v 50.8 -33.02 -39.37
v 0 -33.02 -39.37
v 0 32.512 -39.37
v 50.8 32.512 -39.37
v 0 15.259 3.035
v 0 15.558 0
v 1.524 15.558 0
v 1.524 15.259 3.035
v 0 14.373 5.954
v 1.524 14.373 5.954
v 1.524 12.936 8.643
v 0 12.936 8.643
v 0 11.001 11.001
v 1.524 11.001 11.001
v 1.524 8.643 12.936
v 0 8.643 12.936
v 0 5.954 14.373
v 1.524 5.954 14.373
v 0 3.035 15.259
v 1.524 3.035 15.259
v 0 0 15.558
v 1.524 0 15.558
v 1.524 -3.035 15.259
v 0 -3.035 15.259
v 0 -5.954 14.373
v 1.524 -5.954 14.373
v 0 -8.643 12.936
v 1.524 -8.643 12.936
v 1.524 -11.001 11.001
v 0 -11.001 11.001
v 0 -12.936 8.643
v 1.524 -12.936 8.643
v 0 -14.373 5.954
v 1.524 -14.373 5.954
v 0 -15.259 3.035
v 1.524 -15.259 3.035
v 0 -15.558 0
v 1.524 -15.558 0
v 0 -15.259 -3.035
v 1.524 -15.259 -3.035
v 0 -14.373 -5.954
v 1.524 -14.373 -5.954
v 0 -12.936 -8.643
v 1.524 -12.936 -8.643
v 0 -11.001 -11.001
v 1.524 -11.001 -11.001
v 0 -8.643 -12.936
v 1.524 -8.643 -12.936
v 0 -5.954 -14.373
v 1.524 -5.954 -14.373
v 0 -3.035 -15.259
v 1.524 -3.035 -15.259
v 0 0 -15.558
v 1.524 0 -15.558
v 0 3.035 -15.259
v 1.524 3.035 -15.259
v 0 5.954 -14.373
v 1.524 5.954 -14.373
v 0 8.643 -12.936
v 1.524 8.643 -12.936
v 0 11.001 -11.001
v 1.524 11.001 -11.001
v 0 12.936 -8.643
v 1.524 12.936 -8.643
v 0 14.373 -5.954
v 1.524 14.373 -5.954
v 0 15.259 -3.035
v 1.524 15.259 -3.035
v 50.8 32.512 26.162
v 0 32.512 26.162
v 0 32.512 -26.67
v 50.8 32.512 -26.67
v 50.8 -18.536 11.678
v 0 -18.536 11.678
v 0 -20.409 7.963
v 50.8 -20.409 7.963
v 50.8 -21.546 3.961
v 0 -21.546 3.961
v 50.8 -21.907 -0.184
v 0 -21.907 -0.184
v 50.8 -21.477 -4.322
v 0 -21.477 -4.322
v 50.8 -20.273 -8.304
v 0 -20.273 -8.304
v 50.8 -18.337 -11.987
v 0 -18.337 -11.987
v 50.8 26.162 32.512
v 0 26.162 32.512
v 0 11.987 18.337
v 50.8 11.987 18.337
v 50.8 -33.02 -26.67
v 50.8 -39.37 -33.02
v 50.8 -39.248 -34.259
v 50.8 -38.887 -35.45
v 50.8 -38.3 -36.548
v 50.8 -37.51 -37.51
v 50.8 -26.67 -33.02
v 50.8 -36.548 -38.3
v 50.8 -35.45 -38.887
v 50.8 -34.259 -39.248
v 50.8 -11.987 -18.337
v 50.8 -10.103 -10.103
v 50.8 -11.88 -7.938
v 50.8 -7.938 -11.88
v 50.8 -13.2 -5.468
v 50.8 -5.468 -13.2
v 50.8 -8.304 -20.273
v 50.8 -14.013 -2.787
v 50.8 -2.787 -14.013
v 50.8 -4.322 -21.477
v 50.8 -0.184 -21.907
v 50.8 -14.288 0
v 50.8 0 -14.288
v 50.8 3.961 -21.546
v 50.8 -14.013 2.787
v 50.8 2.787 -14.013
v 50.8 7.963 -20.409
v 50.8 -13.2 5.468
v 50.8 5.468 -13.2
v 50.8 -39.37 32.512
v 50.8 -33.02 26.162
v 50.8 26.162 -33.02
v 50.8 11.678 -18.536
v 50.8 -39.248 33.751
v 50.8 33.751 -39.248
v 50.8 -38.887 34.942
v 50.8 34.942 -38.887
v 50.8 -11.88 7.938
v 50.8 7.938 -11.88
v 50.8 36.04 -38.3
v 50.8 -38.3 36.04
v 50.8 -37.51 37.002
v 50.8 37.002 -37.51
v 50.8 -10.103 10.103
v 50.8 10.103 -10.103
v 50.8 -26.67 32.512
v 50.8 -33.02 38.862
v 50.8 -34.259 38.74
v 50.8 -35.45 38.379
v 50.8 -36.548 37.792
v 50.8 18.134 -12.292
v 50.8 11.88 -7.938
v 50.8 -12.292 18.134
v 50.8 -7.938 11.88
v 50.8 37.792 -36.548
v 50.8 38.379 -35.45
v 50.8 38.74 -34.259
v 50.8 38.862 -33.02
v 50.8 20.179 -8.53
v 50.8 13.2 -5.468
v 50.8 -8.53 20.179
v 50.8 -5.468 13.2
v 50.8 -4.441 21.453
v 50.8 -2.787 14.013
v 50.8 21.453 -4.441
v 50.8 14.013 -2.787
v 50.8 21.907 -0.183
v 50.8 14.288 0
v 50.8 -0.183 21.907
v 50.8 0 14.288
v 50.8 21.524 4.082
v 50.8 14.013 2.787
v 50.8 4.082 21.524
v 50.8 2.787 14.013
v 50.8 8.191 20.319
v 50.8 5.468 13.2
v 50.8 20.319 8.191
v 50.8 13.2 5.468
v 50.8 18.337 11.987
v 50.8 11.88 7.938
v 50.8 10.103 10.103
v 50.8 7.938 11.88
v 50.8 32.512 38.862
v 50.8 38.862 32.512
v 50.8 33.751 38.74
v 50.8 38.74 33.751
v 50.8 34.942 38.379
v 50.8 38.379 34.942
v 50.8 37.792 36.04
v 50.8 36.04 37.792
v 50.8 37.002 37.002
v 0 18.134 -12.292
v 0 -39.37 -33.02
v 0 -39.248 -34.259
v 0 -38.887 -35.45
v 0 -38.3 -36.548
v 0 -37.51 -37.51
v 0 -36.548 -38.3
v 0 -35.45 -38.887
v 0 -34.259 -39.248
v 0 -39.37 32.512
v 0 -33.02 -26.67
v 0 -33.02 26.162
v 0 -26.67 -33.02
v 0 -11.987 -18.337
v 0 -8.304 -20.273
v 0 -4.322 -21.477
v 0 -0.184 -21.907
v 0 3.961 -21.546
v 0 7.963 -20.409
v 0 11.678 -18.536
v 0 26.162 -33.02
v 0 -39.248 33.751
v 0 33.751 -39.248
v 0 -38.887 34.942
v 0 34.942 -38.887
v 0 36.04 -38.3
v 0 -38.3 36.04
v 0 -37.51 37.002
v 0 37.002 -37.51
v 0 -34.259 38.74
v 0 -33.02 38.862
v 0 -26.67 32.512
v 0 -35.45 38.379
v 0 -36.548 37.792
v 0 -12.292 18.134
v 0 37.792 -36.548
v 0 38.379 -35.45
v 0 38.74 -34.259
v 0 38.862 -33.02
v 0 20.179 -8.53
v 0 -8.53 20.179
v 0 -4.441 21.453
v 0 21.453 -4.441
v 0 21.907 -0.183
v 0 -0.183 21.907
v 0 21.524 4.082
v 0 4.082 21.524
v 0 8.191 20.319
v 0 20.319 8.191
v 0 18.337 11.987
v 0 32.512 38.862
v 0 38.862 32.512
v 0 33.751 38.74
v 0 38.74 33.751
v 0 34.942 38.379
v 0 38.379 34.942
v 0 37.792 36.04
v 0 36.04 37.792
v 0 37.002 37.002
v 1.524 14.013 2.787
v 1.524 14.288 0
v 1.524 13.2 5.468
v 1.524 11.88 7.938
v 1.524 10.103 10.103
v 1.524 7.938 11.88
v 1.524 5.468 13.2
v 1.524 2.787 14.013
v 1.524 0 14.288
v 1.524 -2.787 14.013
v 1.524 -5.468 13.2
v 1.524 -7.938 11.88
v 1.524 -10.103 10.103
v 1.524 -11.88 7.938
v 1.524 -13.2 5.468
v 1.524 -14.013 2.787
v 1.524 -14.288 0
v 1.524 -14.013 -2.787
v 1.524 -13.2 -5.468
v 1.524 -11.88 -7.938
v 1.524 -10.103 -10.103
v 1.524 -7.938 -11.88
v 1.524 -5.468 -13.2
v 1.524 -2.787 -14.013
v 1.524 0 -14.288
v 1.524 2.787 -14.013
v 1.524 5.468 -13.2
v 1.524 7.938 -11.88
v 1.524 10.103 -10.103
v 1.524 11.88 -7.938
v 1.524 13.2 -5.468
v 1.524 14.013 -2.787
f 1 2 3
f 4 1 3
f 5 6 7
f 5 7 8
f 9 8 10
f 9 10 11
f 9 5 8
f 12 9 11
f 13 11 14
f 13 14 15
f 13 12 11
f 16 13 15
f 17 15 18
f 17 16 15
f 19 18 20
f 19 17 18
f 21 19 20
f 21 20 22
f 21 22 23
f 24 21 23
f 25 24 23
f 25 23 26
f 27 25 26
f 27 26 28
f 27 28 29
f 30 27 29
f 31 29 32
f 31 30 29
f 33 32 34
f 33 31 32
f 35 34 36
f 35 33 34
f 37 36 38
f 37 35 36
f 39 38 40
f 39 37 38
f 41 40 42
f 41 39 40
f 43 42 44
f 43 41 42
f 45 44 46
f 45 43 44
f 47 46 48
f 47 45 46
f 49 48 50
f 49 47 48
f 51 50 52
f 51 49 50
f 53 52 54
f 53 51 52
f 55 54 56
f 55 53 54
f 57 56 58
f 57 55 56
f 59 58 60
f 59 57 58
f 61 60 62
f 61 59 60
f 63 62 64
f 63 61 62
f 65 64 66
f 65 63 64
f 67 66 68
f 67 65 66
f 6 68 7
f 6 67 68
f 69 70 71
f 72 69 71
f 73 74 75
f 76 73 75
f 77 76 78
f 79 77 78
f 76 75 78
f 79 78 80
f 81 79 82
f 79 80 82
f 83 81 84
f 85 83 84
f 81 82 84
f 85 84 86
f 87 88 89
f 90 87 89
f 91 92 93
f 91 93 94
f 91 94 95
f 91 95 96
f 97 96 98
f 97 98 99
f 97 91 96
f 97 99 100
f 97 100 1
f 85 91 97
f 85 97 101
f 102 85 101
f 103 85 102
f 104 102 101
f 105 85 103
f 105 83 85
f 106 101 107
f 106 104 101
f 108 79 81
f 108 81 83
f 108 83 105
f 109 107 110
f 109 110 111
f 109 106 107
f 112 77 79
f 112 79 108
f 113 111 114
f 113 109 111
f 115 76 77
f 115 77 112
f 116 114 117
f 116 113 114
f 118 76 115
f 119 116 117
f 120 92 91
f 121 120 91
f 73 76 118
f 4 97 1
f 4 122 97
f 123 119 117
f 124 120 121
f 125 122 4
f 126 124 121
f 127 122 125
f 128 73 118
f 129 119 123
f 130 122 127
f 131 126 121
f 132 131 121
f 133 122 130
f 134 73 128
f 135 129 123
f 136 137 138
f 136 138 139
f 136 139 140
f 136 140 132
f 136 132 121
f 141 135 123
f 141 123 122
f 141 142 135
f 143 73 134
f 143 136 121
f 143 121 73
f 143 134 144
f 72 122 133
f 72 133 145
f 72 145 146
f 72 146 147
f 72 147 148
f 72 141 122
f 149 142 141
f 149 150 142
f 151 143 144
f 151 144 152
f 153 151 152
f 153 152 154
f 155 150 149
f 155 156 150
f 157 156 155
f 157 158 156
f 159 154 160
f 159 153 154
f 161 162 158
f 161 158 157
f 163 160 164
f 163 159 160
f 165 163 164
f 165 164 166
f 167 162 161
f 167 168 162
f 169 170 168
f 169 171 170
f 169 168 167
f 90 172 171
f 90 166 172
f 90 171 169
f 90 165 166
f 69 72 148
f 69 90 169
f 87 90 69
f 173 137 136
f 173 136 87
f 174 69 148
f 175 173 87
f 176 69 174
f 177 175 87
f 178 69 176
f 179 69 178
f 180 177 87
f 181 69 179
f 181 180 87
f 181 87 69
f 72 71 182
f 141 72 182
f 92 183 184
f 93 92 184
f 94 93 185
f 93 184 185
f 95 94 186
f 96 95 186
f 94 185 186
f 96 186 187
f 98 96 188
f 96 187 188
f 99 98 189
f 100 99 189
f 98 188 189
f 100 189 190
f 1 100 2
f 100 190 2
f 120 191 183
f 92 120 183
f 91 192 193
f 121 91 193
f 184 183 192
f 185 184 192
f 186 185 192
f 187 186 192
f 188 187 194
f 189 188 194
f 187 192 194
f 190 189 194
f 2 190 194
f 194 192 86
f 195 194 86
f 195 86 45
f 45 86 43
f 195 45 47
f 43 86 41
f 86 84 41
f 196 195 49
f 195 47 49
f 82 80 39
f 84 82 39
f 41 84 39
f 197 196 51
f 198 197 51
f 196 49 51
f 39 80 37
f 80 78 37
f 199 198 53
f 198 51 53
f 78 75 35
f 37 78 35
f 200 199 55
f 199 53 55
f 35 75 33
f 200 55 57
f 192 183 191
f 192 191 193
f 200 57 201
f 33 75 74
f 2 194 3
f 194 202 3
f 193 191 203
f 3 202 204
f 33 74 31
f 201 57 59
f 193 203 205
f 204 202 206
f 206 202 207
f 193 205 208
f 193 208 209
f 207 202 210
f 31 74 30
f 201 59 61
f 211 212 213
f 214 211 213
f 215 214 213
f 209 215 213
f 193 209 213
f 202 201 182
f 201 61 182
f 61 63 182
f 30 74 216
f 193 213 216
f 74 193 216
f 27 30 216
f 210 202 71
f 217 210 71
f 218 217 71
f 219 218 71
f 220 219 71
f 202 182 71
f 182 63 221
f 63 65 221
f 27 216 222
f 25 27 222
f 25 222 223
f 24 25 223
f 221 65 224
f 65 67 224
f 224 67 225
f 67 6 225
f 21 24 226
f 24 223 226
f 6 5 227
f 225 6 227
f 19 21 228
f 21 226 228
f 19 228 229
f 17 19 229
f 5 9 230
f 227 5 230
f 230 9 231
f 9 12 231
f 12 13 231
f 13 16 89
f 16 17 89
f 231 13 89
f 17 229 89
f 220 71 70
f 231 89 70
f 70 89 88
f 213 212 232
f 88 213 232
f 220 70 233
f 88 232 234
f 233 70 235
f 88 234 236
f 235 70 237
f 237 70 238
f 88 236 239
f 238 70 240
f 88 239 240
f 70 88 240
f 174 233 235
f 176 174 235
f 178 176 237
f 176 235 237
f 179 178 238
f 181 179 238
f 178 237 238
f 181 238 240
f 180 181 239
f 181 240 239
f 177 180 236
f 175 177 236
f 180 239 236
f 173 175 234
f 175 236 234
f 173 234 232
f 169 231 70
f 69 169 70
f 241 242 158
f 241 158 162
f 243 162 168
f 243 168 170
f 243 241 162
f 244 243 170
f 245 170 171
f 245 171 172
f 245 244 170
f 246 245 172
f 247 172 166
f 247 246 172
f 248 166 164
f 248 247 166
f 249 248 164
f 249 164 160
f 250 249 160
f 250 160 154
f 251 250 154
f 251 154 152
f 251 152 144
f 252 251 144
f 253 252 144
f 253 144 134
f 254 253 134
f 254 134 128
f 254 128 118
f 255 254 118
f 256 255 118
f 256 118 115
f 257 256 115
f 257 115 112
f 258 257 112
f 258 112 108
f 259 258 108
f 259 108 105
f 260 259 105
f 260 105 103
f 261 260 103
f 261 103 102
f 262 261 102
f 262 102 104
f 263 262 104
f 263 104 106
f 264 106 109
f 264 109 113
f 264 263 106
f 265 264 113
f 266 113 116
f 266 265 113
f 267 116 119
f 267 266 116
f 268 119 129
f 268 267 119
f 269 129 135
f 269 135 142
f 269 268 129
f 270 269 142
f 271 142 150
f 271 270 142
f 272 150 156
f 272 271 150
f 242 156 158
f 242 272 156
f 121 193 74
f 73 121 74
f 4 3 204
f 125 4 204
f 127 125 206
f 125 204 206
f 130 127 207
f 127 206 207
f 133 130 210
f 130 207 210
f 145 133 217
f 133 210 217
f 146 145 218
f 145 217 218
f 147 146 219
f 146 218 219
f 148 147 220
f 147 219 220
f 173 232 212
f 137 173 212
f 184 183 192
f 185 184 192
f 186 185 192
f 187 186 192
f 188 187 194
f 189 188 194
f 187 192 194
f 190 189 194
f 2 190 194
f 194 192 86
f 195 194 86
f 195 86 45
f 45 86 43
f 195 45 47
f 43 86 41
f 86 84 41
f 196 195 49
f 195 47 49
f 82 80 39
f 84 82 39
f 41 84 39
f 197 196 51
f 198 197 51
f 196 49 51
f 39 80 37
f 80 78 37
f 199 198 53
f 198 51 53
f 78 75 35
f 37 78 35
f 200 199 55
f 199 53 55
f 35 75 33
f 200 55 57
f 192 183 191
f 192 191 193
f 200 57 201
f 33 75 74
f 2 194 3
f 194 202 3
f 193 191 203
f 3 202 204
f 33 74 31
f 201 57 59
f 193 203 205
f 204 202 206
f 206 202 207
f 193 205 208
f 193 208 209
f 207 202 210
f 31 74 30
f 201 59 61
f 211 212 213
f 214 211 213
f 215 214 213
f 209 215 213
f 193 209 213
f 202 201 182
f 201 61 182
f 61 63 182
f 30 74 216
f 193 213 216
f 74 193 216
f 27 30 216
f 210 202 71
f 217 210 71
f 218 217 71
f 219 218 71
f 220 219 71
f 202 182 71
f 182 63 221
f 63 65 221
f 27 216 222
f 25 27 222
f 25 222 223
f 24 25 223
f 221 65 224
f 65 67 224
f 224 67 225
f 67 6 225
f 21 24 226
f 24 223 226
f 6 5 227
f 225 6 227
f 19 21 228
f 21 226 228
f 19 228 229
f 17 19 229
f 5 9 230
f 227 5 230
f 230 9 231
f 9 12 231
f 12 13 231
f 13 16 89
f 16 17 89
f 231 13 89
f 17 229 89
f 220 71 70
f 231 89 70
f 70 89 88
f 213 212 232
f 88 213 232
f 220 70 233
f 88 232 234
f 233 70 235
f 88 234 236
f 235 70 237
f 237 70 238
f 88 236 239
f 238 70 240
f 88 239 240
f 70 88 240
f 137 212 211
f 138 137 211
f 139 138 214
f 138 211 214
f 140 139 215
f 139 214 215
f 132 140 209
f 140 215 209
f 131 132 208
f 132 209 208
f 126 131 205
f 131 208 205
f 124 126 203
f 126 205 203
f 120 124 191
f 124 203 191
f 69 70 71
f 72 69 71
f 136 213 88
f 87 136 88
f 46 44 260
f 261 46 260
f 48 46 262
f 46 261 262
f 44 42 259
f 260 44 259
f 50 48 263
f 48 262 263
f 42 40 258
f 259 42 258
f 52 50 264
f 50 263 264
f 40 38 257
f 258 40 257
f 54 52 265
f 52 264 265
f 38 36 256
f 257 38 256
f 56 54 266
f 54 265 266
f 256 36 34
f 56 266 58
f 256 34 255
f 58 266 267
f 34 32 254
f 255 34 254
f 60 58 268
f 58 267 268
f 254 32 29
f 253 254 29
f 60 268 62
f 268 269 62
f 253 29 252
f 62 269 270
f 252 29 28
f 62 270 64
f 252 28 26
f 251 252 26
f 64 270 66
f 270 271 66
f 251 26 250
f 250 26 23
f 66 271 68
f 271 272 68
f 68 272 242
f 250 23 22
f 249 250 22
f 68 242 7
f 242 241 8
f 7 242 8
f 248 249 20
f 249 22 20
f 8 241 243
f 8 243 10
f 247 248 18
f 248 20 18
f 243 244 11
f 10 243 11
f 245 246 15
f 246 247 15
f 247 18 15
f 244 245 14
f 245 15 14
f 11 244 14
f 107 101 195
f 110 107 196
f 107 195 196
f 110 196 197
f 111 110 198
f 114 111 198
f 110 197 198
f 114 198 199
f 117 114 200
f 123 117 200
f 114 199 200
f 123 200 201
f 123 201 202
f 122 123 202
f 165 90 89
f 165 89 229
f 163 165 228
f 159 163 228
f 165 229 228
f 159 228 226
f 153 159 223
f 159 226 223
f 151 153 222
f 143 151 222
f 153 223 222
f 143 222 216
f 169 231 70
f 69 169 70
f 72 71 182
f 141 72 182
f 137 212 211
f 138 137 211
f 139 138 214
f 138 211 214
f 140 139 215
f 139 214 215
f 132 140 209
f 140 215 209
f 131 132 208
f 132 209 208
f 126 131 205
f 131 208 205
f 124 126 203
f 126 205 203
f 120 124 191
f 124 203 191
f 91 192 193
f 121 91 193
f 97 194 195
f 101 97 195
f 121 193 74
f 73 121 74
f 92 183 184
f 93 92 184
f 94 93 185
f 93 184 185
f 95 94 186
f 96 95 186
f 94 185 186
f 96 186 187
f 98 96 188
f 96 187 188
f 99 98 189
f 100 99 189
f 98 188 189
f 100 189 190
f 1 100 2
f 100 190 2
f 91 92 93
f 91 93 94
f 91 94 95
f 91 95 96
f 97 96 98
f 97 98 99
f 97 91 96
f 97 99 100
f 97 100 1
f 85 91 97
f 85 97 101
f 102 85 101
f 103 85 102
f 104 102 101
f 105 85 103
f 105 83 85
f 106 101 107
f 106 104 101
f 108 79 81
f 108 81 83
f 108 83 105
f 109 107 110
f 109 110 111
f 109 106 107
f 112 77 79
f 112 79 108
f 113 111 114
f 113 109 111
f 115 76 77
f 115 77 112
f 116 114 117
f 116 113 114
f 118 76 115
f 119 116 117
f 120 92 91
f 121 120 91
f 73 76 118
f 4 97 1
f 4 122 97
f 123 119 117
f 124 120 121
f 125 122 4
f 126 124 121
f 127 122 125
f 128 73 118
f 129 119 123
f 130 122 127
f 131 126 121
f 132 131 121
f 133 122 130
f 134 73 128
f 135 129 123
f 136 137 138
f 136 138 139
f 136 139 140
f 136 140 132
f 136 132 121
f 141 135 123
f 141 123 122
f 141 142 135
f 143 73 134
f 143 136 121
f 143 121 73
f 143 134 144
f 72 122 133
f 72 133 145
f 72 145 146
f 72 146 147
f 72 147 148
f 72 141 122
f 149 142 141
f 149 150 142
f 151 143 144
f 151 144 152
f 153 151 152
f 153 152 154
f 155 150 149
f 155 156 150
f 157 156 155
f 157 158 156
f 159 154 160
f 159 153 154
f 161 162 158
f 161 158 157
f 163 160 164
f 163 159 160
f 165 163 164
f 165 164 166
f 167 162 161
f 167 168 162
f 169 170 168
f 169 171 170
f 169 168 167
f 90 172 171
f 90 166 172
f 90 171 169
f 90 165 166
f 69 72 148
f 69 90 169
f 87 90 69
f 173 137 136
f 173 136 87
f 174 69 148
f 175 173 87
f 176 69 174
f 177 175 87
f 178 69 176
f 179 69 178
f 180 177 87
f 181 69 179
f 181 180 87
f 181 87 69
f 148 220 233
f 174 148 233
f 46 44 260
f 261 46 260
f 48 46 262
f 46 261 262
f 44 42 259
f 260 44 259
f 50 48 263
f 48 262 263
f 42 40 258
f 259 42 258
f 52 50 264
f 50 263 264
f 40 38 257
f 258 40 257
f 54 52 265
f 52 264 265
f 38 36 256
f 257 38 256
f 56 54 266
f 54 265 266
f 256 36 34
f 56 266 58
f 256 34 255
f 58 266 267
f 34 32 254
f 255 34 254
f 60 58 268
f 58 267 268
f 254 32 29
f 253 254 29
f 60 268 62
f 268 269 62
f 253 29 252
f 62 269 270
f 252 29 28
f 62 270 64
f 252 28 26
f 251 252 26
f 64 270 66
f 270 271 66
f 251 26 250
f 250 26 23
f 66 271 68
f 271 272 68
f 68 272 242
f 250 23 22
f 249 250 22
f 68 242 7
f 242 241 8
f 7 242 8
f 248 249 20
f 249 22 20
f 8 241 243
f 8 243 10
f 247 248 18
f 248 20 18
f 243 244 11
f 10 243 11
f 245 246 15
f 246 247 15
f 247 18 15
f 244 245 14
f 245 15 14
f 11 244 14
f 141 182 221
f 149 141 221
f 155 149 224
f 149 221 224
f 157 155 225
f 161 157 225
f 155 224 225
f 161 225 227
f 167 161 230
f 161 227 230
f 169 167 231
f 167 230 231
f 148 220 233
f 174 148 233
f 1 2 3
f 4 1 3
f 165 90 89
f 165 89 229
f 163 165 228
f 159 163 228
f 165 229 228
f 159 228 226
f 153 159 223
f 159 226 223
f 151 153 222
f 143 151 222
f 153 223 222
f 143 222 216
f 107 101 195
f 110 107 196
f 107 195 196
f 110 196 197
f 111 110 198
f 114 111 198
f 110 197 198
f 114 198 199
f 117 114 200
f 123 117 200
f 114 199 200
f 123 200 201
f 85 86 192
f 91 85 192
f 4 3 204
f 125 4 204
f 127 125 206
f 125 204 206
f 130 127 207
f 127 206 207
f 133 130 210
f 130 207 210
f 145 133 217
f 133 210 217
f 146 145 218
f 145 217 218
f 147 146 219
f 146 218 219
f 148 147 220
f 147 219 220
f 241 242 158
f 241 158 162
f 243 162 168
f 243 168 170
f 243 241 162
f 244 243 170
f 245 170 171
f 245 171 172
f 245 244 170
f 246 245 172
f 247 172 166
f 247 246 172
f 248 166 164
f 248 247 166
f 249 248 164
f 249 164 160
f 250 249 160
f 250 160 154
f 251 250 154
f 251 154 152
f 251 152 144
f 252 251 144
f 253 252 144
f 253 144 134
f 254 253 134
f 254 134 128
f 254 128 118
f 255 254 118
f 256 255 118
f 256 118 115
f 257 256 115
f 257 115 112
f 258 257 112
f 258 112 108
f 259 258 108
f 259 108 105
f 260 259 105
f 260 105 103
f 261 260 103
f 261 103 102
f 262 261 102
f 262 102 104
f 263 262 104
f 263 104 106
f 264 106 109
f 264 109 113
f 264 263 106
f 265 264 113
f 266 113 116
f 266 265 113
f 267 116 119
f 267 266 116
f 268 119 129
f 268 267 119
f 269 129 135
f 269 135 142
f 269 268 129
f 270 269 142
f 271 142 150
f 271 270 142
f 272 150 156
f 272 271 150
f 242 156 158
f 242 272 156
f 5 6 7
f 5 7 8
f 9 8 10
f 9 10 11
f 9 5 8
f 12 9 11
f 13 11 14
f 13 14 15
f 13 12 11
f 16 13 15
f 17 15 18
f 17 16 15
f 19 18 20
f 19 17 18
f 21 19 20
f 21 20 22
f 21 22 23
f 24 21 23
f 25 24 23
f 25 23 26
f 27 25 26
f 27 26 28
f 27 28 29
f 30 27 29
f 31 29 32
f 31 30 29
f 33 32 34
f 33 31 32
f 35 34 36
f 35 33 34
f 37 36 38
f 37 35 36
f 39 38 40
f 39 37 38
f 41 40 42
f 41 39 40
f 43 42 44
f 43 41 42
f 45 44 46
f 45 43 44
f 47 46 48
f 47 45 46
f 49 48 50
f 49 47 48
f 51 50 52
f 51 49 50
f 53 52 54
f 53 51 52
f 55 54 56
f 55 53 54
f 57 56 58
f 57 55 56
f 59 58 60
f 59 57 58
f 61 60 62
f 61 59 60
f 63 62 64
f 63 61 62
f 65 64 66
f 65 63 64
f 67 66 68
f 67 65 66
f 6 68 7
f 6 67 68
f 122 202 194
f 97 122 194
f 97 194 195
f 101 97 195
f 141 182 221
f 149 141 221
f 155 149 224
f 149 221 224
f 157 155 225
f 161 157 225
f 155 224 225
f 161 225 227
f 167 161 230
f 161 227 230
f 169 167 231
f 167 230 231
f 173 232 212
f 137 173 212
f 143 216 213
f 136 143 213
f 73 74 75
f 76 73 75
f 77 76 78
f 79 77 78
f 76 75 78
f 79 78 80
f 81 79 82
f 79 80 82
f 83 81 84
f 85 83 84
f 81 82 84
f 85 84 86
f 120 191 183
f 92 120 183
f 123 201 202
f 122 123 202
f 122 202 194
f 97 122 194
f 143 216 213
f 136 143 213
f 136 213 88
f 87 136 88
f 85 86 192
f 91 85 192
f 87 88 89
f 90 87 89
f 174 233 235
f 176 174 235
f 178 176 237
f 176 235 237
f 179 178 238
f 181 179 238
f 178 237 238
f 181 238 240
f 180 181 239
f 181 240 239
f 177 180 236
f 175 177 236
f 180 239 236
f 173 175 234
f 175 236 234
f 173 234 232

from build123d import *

# Parameters (mm, degrees)
F0_R     = 14.2875
F1_DEPTH = 50.8
F3_DEPTH = 50.8
F2_R     = 15.5575
F2_R_2   = 14.2875
F4_DEPTH = 1.524


with BuildPart() as f1:
    # F0 (on Right) → F1 (new body)
    with BuildSketch(Plane.YZ):
        with BuildLine():
            Line((32.512, 38.862), (-33.02, 38.862))
            ThreePointArc((-33.02, 38.862), (-37.510128, 37.002128), (-39.37, 32.512))
            Line((-39.37, 32.512), (-39.37, -33.02))
            ThreePointArc((-39.37, -33.02), (-37.510128, -37.510128), (-33.02, -39.37))
            Line((-33.02, -39.37), (32.512, -39.37))
            ThreePointArc((32.512, -39.37), (37.002128, -37.510128), (38.862, -33.02))
            Line((38.862, -33.02), (38.862, 32.512))
            ThreePointArc((38.862, 32.512), (37.002128, 37.002128), (32.512, 38.862))
        make_face()
        with BuildLine():
            Line((11.677662, -18.535662), (26.162, -33.02))
            Line((26.162, -33.02), (-26.67, -33.02))
            Line((-26.67, -33.02), (-11.987079, -18.337079))
            ThreePointArc((-11.987079, -18.337079), (-0.18383, -21.906729), (11.677662, -18.535662))
        make_face(mode=Mode.SUBTRACT)
        with BuildLine():
            Line((-33.02, -26.67), (-33.02, 26.162))
            Line((-33.02, 26.162), (-18.535662, 11.677662))
            ThreePointArc((-18.535662, 11.677662), (-21.906729, -0.18383), (-18.337079, -11.987079))
            Line((-18.337079, -11.987079), (-33.02, -26.67))
        make_face(mode=Mode.SUBTRACT)
        Circle(F0_R, mode=Mode.SUBTRACT)
        with BuildLine():
            Line((18.337079, 11.987079), (32.512, 26.162))
            Line((32.512, 26.162), (32.512, -26.67))
            Line((32.512, -26.67), (18.134055, -12.292055))
            ThreePointArc((18.134055, -12.292055), (21.906734, -0.183186), (18.337079, 11.987079))
        make_face(mode=Mode.SUBTRACT)
        with BuildLine():
            Line((-26.67, 32.512), (26.162, 32.512))
            Line((26.162, 32.512), (11.987079, 18.337079))
            ThreePointArc((11.987079, 18.337079), (-0.183186, 21.906734), (-12.292055, 18.134055))
            Line((-12.292055, 18.134055), (-26.67, 32.512))
        make_face(mode=Mode.SUBTRACT)
    extrude(amount=F1_DEPTH)


with BuildPart() as f3:
    # F0 (on Right) → F3 (new body)
    with BuildSketch(Plane.YZ):
        with BuildLine():
            Line((32.512, 38.862), (-33.02, 38.862))
            ThreePointArc((-33.02, 38.862), (-37.510128, 37.002128), (-39.37, 32.512))
            Line((-39.37, 32.512), (-39.37, -33.02))
            ThreePointArc((-39.37, -33.02), (-37.510128, -37.510128), (-33.02, -39.37))
            Line((-33.02, -39.37), (32.512, -39.37))
            ThreePointArc((32.512, -39.37), (37.002128, -37.510128), (38.862, -33.02))
            Line((38.862, -33.02), (38.862, 32.512))
            ThreePointArc((38.862, 32.512), (37.002128, 37.002128), (32.512, 38.862))
        make_face()
        with BuildLine():
            Line((11.677662, -18.535662), (26.162, -33.02))
            Line((26.162, -33.02), (-26.67, -33.02))
            Line((-26.67, -33.02), (-11.987079, -18.337079))
            ThreePointArc((-11.987079, -18.337079), (-0.18383, -21.906729), (11.677662, -18.535662))
        make_face(mode=Mode.SUBTRACT)
        with BuildLine():
            Line((-33.02, -26.67), (-33.02, 26.162))
            Line((-33.02, 26.162), (-18.535662, 11.677662))
            ThreePointArc((-18.535662, 11.677662), (-21.906729, -0.18383), (-18.337079, -11.987079))
            Line((-18.337079, -11.987079), (-33.02, -26.67))
        make_face(mode=Mode.SUBTRACT)
        Circle(F0_R, mode=Mode.SUBTRACT)
        with BuildLine():
            Line((18.337079, 11.987079), (32.512, 26.162))
            Line((32.512, 26.162), (32.512, -26.67))
            Line((32.512, -26.67), (18.134055, -12.292055))
            ThreePointArc((18.134055, -12.292055), (21.906734, -0.183186), (18.337079, 11.987079))
        make_face(mode=Mode.SUBTRACT)
        with BuildLine():
            Line((-26.67, 32.512), (26.162, 32.512))
            Line((26.162, 32.512), (11.987079, 18.337079))
            ThreePointArc((11.987079, 18.337079), (-0.183186, 21.906734), (-12.292055, 18.134055))
            Line((-12.292055, 18.134055), (-26.67, 32.512))
        make_face(mode=Mode.SUBTRACT)
    extrude(amount=F3_DEPTH)


with BuildPart() as f4_tool:
    # F2 (on Right) → F4 (new body)
    with BuildSketch(Plane.YZ):
        Circle(F2_R)
        Circle(F2_R_2, mode=Mode.SUBTRACT)
    extrude(amount=F4_DEPTH)


with BuildPart() as f1_1:
    add(f1.part)

    # F4: cut by f4_tool
    add(f4_tool.part, mode=Mode.SUBTRACT)


with BuildPart() as f3_1:
    add(f3.part)

    # F4: cut by f4_tool
    add(f4_tool.part, mode=Mode.SUBTRACT)


solid = Compound([f1_1.part, f3_1.part])
